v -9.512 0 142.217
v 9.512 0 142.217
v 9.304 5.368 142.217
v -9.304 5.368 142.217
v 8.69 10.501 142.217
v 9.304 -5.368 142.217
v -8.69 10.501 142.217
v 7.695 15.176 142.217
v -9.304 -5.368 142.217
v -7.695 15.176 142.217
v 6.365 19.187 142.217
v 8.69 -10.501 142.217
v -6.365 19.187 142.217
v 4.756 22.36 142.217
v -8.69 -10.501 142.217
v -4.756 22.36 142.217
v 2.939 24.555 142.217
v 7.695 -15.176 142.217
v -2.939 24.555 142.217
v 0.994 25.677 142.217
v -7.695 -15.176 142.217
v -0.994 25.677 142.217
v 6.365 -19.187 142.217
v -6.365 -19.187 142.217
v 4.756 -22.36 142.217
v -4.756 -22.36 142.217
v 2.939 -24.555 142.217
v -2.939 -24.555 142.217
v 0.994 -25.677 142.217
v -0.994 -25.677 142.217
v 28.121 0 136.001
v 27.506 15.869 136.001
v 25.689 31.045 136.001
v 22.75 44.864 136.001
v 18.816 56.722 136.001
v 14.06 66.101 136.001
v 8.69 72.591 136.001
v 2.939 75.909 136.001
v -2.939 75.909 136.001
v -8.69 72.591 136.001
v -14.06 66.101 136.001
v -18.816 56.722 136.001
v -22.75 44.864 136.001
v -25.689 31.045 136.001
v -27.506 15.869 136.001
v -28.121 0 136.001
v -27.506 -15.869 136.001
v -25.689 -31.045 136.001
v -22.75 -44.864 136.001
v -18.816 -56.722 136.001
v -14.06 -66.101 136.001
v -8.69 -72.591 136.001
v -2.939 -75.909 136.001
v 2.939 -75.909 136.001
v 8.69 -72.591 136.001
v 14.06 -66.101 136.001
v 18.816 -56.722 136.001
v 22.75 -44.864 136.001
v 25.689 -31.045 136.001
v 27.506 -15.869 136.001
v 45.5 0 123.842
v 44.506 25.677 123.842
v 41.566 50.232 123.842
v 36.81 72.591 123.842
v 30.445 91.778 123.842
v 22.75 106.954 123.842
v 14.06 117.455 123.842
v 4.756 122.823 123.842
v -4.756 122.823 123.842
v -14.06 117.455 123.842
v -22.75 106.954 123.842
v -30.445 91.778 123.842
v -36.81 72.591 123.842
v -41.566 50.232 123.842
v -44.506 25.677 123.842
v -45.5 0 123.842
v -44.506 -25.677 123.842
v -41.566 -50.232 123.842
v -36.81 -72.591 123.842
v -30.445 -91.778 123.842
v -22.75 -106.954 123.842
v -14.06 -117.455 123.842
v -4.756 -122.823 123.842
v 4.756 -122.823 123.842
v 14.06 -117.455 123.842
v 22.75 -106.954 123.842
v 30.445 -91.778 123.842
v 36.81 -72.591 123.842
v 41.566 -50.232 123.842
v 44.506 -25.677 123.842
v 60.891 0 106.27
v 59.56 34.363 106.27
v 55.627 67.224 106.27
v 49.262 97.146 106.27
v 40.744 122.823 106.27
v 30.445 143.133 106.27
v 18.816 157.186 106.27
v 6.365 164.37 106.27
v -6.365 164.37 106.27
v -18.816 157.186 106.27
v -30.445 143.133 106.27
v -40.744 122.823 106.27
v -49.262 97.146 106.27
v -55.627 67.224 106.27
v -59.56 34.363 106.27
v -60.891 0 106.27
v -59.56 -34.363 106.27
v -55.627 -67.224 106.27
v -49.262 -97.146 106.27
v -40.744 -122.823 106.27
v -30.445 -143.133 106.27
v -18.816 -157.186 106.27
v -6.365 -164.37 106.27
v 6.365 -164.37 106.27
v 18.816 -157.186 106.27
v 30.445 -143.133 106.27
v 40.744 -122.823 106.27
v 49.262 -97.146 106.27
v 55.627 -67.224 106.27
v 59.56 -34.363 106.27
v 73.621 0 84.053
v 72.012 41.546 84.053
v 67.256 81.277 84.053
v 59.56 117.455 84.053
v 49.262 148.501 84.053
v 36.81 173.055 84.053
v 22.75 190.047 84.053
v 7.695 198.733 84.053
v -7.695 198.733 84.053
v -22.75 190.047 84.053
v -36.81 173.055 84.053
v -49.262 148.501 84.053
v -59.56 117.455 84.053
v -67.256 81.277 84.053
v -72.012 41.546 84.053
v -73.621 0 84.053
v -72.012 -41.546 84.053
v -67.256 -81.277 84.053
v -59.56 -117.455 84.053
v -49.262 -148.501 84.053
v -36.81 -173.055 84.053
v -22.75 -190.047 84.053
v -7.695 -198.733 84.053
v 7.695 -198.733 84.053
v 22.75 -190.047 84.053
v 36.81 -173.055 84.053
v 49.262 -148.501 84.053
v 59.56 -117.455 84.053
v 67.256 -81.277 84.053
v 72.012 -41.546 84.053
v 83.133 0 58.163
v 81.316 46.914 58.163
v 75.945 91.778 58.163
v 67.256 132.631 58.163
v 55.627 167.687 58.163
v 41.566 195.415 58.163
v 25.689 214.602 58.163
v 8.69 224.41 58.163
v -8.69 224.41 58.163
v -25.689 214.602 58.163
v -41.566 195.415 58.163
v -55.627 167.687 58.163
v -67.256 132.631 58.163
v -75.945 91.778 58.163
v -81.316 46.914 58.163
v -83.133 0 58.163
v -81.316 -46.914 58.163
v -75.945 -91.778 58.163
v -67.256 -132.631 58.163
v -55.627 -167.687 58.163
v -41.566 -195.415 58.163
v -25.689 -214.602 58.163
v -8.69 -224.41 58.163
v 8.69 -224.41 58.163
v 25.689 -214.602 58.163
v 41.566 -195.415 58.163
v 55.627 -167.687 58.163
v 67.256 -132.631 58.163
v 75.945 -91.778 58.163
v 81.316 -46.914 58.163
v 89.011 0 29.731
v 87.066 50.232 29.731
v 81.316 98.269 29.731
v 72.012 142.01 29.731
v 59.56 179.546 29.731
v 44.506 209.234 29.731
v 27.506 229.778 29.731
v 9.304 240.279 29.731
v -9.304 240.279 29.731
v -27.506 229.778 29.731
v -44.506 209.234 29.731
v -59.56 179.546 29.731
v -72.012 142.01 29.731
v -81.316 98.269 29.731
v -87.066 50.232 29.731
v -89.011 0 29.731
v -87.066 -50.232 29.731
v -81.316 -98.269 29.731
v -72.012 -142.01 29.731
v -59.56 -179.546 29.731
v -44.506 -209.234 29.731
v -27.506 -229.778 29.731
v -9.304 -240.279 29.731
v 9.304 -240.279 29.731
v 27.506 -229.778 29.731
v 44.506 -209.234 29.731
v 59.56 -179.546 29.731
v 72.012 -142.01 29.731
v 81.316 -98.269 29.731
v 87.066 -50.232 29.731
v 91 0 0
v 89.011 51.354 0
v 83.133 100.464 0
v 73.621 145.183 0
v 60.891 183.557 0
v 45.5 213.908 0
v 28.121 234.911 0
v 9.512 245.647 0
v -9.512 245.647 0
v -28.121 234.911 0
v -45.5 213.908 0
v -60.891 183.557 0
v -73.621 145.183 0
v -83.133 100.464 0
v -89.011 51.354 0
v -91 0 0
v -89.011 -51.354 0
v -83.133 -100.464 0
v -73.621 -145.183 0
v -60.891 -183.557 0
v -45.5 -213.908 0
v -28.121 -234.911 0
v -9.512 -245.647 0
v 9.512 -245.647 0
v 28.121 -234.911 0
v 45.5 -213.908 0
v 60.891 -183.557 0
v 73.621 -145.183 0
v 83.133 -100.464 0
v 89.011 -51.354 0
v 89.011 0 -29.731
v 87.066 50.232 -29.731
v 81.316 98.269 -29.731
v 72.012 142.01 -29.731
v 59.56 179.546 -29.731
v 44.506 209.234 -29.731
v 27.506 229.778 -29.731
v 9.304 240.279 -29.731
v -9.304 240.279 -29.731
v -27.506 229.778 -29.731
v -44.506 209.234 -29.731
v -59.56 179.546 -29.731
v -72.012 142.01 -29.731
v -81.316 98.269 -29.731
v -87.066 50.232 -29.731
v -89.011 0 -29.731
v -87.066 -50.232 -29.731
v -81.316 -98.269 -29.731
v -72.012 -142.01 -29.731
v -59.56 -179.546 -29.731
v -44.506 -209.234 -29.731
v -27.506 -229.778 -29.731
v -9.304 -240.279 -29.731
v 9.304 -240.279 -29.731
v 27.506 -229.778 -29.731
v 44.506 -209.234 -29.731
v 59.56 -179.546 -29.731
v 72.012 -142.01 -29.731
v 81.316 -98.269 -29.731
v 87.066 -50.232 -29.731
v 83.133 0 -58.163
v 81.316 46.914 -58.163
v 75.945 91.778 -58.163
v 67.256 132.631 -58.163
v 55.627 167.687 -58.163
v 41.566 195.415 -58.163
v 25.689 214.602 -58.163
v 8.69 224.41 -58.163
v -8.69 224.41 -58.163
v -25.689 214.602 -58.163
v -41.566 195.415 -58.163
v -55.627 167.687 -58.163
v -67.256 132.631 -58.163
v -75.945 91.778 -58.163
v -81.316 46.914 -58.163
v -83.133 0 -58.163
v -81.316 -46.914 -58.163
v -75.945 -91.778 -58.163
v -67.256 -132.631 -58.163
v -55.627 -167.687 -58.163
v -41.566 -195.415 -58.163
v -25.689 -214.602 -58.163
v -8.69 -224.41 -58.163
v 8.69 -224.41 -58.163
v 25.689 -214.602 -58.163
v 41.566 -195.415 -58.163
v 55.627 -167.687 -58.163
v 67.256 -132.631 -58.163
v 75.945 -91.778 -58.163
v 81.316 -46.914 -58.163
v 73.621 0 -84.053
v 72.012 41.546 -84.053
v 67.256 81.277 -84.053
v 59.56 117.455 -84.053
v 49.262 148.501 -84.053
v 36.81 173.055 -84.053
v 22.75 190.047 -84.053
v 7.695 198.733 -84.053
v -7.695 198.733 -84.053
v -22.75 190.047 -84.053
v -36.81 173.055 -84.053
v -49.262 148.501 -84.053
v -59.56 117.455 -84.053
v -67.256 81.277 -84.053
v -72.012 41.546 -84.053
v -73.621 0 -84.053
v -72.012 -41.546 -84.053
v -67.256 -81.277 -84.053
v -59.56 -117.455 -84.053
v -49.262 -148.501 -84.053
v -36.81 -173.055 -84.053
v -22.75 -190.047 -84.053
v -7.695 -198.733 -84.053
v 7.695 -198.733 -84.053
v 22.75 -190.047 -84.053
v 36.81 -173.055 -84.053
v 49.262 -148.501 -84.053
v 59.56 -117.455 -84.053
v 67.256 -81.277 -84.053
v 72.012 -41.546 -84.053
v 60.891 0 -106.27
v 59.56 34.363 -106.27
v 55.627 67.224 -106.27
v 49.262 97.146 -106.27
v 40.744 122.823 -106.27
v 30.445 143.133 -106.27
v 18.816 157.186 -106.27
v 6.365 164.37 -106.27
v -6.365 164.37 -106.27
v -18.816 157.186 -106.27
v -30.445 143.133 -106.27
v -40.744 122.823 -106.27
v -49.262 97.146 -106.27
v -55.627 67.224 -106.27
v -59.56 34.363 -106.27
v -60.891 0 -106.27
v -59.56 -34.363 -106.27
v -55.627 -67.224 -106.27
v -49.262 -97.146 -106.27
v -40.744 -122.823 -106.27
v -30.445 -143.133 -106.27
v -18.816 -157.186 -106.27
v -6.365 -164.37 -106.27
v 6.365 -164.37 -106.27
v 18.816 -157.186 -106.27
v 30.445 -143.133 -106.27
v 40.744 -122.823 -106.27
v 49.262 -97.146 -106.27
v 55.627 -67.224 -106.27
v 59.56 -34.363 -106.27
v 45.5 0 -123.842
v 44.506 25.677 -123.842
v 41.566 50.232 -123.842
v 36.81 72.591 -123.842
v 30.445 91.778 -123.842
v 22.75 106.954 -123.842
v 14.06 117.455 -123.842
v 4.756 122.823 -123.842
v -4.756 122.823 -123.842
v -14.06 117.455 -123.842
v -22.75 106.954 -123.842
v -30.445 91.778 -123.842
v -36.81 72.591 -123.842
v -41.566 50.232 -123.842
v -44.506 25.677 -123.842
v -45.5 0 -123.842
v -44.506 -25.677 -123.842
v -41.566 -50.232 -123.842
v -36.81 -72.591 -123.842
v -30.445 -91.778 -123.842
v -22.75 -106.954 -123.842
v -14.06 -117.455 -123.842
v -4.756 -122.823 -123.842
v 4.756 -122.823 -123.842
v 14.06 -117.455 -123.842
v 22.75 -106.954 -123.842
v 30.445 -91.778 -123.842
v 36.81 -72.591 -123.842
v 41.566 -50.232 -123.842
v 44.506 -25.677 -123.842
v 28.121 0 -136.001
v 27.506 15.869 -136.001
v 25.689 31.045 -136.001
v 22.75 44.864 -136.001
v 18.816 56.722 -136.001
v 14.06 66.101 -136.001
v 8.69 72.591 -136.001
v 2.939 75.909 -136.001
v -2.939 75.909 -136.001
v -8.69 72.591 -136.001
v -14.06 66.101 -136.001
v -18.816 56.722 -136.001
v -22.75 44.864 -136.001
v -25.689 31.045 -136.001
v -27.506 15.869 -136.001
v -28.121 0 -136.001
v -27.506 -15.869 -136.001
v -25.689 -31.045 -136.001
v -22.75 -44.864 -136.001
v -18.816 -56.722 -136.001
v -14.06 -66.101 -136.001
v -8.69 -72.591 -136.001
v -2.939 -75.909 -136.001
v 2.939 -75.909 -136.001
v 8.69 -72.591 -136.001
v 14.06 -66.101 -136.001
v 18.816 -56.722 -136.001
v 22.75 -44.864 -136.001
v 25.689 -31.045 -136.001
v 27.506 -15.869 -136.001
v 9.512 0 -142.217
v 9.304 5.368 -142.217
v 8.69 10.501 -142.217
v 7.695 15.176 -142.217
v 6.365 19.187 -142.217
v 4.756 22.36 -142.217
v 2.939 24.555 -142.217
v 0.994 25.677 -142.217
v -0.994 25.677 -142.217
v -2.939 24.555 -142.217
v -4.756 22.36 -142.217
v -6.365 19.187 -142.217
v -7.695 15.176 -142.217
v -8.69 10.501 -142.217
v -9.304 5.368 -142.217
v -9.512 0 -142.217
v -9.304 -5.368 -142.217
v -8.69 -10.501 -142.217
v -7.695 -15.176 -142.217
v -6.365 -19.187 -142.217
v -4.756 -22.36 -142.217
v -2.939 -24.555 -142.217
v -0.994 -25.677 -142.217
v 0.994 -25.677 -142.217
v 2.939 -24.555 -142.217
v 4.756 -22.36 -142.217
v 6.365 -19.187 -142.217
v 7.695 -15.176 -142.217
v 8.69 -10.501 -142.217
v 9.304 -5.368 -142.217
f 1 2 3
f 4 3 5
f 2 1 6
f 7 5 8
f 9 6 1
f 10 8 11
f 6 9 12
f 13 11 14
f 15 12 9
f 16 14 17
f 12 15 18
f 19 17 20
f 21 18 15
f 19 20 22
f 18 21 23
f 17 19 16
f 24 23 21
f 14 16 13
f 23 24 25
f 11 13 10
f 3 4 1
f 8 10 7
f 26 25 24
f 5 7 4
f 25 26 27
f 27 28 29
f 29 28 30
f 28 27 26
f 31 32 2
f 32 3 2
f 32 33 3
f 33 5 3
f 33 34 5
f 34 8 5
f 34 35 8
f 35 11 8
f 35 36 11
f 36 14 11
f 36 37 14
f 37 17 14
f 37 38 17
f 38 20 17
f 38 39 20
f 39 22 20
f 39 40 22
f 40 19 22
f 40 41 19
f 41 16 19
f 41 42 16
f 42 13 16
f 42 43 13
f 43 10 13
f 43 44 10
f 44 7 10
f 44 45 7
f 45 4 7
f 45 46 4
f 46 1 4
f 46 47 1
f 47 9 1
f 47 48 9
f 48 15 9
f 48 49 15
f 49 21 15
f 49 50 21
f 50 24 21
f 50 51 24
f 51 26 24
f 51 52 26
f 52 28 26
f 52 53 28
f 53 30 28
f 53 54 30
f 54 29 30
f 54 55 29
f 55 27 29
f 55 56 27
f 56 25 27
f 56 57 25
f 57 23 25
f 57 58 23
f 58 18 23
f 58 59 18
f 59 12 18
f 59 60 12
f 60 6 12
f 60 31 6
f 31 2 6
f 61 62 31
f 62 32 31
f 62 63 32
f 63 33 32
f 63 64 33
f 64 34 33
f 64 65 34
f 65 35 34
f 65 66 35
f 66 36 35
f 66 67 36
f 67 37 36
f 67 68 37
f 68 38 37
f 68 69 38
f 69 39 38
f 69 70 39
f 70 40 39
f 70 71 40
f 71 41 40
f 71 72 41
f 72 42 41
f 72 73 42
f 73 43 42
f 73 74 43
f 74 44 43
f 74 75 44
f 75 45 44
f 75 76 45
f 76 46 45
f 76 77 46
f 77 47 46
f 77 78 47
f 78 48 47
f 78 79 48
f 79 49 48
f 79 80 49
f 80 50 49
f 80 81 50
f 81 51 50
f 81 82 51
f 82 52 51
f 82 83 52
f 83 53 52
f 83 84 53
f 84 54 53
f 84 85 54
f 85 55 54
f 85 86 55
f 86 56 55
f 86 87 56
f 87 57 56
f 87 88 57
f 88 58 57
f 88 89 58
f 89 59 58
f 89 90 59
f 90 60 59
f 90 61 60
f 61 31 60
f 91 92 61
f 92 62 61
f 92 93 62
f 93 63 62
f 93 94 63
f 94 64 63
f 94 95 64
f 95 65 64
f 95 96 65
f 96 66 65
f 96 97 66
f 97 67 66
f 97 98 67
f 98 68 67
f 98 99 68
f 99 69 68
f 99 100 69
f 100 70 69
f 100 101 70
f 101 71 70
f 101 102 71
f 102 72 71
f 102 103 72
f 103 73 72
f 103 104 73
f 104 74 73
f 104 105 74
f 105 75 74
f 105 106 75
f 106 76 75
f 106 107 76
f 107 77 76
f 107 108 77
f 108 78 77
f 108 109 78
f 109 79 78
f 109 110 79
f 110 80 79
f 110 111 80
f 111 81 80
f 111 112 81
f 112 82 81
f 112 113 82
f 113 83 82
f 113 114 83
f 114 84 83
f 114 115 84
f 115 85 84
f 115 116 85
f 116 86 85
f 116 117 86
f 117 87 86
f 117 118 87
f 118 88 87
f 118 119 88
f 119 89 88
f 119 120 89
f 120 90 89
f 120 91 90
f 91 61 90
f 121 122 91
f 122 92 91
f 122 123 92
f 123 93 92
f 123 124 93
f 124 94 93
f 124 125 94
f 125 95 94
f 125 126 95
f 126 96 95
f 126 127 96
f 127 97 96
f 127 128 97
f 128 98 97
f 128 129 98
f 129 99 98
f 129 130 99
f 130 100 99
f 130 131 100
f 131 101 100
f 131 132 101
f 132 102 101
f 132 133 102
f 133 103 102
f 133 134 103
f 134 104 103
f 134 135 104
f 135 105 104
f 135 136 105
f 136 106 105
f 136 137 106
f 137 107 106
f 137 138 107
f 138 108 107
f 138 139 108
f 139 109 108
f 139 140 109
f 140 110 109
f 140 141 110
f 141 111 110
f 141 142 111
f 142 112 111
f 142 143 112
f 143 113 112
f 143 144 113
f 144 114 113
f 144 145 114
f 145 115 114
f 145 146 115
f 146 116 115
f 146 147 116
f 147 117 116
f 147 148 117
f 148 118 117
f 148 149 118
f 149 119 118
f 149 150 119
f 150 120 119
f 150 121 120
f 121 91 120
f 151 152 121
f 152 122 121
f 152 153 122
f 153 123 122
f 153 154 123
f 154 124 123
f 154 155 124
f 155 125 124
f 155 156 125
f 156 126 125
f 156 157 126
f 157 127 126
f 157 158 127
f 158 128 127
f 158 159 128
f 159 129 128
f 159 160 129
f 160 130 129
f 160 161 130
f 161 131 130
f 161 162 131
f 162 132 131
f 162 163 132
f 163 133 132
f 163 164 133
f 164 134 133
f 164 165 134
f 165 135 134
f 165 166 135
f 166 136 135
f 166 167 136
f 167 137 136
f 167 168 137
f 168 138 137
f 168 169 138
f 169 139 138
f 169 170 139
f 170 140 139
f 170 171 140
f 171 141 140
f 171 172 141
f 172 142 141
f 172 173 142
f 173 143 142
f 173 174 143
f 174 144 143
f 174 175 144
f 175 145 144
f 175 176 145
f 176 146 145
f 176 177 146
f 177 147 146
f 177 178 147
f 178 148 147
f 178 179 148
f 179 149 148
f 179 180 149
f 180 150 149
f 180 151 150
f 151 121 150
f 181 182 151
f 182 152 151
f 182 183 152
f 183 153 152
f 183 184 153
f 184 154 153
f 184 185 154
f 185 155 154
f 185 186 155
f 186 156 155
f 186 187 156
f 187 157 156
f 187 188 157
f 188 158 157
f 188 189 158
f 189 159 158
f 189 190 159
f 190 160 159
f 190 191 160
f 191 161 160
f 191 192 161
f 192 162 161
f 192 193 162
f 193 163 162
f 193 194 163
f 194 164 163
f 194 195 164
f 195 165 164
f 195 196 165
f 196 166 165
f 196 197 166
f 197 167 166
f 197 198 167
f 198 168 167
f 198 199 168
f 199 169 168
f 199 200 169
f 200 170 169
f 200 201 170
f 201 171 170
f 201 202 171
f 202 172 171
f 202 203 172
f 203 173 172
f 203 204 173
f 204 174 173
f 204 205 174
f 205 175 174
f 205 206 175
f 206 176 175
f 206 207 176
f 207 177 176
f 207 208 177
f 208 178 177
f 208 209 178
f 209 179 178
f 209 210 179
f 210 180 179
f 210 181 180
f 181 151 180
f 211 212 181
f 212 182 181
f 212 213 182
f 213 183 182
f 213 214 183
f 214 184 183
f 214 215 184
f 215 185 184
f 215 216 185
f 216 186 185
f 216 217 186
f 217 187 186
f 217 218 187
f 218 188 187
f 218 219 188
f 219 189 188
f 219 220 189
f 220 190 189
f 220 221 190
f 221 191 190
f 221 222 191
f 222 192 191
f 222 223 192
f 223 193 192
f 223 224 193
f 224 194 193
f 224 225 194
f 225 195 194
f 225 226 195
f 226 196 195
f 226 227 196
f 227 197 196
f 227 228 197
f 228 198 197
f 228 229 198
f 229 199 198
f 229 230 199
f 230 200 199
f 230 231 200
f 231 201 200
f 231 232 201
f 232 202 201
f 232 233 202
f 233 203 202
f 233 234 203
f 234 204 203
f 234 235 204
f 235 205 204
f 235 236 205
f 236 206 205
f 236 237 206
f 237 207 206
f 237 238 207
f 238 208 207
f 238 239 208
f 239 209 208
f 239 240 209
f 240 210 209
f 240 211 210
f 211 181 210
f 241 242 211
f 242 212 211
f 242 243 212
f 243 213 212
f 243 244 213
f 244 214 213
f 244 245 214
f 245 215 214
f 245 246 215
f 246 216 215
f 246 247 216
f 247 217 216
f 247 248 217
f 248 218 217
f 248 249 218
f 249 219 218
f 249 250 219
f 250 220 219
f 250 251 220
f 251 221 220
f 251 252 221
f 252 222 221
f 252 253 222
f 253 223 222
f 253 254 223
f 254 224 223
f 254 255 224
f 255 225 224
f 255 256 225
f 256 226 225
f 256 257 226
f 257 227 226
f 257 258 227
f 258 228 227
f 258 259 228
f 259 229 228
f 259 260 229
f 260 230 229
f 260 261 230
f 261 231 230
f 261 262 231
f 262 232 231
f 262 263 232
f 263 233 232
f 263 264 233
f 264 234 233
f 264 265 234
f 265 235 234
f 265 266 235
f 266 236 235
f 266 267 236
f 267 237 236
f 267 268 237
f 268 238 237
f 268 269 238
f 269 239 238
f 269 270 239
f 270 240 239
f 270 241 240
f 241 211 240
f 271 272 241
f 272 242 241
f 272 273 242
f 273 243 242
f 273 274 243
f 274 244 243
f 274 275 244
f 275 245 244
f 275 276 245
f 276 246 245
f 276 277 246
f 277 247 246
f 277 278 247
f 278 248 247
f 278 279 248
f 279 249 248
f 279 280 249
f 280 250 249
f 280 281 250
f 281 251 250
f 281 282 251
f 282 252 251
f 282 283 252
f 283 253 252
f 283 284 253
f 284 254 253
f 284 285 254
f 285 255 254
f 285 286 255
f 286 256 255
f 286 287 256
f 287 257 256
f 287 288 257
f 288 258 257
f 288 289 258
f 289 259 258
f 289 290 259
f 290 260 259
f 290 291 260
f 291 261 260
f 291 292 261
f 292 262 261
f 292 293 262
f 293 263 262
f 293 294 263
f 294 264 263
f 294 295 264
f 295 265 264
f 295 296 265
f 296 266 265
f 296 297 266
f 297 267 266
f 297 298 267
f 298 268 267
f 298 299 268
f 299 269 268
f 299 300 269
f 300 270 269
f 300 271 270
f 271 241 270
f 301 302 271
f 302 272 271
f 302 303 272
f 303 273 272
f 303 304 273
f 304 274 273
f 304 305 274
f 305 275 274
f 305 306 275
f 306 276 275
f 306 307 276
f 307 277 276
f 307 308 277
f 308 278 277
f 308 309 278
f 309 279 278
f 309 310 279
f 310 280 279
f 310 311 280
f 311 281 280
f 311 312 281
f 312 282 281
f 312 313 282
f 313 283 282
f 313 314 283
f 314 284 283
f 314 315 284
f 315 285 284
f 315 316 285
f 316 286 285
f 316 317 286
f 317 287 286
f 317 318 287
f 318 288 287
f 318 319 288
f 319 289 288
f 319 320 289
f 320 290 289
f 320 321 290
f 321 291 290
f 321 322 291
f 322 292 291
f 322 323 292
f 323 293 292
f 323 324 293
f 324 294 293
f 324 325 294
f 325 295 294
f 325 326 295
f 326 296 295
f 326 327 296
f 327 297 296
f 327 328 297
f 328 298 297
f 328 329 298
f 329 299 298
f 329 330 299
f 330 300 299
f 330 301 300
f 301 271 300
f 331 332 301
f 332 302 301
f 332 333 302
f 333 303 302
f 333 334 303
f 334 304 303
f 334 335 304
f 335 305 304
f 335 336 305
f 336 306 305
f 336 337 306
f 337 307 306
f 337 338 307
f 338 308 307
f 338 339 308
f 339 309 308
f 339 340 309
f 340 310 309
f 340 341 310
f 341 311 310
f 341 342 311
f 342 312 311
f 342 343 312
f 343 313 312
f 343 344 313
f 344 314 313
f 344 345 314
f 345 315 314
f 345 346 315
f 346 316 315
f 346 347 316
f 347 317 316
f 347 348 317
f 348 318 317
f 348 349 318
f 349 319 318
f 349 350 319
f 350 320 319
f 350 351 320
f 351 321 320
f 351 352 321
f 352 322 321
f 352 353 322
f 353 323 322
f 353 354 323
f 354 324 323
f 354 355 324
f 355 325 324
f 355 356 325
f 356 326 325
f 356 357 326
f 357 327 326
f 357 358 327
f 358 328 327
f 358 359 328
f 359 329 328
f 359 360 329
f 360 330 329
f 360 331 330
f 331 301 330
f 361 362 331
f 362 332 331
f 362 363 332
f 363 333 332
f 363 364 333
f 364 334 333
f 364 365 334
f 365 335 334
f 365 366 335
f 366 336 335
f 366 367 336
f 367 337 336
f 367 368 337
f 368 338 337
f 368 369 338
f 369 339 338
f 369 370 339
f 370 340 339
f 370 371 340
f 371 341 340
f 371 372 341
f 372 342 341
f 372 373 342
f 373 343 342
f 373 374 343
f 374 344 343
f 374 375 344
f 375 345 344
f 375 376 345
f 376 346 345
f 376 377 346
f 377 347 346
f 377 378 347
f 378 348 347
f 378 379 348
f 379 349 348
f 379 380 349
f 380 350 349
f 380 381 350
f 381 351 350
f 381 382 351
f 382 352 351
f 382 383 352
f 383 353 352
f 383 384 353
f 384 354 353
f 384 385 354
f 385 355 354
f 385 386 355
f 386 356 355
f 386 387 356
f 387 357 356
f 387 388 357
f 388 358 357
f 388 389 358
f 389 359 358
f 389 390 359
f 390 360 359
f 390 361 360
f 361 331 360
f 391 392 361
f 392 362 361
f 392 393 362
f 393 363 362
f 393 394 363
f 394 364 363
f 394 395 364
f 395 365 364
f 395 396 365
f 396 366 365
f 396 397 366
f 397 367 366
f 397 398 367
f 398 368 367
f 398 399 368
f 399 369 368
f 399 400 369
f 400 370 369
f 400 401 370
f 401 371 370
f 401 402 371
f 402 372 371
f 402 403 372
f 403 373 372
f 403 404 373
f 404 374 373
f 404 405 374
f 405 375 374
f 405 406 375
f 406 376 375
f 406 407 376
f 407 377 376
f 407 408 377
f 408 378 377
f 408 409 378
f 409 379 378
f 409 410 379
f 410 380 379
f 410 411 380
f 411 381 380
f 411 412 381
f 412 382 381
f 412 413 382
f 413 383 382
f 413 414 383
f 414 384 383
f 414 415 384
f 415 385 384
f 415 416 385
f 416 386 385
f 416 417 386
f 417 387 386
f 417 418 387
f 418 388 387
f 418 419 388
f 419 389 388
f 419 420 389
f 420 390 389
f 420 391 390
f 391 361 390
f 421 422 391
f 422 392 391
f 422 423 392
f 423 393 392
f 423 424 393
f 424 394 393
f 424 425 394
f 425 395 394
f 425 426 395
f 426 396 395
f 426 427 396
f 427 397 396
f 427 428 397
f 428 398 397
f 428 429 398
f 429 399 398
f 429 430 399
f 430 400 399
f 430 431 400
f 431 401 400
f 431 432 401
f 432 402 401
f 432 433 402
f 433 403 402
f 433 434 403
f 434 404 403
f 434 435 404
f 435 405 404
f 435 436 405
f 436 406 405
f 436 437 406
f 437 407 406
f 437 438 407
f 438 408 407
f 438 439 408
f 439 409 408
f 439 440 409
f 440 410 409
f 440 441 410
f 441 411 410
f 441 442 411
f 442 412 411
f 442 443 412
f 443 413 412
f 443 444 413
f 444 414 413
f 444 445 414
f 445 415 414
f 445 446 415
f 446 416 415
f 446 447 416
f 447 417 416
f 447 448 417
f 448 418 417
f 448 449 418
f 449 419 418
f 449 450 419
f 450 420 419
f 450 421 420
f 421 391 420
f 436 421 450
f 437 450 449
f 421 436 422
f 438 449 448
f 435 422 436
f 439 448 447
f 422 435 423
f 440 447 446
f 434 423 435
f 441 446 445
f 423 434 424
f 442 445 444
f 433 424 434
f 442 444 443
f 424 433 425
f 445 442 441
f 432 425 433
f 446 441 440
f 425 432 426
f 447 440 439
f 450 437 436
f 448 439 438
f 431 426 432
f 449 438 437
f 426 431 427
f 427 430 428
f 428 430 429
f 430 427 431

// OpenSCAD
// Generated by SolidPython 1.0.1 on 2020-07-29 00:46:48


scale(v = [7, 19, 11]) {
	sphere(r = 13);
}
/***********************************************
*********      SolidPython code:      **********
************************************************
 
# import packages: SolidPython
from solid import *
from solid.utils import *
from itertools import chain, combinations, permutations


class Resize:

    def __init__(self, scad_file):
        self.scad_file = scad_file
        #self.scad_file = import_scad(scad_file)
        # cone/cylinder param:
        self.r1 = 0
        self.r2 = 0
        self.h = 0
        # rectangular prism param:
        self.w = 0
        self.l = 0
        # ellipse param:
        self.r = 0

    # import OpenScad code (file name corresponds to shape)


    # classify shape + parameters
    def assign(self, param1, param2, param3):
        if self.scad_file == 'cone.scad':
            self.r1 = param1
            self.r2 = param2
            self.h = param3
        elif self.scad_file == 'cylinder.scad':
            self.r1 = param1
            self.r2 = param2
            self.h = param3
        elif self.scad_file == 'rectangularPrism.scad':
            self.h = param1
            self.l = param2
            self.w = param3
        else:
            self.r = param1
            self.h = param2

    # resize parameters
    def iterate(self):
        x = range(3, 20, 2)
        i = 1
        if self.scad_file == 'cone.scad':
            tempList = list(permutations(x, 2))
            for temp in tempList:
                param1 = temp[0]
                param2 = temp[1]
                filepath = 'produced_scad_files/' + 'cone' + str(param1) + '_' + str(param2) + '_' + '.scad'
                scad_render_to_file(cylinder(h=param1, r1=param2, r2=0), filepath)

        elif self.scad_file == 'cylinder.scad':
            tempList = list(permutations(x, 3))
            for temp in tempList:
                param1 = temp[0]
                param2 = temp[1]
                filepath = 'produced_scad_files/' + 'cylinder' + str(param1) + '_' + str(param2) + '_' + '.scad'
                scad_render_to_file(cylinder(h=param1, r1=param2, r2=param2), filepath)

        elif self.scad_file == 'rectangularPrism.scad':
            tempList = list(permutations(x, 3))
            for temp in tempList:
                param1 = temp[0]
                param2 = temp[1]
                param3 = temp[2]
                filepath = 'produced_scad_files/' + 'rectangularPrism' + str(param1) + '_' + str(param2) + '_' + str(
                    param3) + '.scad'
                scad_render_to_file(cube(size=(param1, param2, param3)), filepath)

        elif self.scad_file == 'ellipse.scad':
            tempList = list(permutations(x, 4))
            for temp in tempList:
                param1 = temp[0]
                param2 = temp[1]
                param3 = temp[2]
                param4 = temp[3]
                filepath = 'produced_scad_files/' + 'ellipse' + str(param1) + '_' + str(param2) + '_' + str(param3) + '_' + str(param4) + '.scad'
                scad_render_to_file(scale([param1, param2, param3])(sphere(r=param4)), filepath)

    def render_to_scadfile(self):
        scad_render_to_file(scad, 'example.scad') 
 
************************************************/
